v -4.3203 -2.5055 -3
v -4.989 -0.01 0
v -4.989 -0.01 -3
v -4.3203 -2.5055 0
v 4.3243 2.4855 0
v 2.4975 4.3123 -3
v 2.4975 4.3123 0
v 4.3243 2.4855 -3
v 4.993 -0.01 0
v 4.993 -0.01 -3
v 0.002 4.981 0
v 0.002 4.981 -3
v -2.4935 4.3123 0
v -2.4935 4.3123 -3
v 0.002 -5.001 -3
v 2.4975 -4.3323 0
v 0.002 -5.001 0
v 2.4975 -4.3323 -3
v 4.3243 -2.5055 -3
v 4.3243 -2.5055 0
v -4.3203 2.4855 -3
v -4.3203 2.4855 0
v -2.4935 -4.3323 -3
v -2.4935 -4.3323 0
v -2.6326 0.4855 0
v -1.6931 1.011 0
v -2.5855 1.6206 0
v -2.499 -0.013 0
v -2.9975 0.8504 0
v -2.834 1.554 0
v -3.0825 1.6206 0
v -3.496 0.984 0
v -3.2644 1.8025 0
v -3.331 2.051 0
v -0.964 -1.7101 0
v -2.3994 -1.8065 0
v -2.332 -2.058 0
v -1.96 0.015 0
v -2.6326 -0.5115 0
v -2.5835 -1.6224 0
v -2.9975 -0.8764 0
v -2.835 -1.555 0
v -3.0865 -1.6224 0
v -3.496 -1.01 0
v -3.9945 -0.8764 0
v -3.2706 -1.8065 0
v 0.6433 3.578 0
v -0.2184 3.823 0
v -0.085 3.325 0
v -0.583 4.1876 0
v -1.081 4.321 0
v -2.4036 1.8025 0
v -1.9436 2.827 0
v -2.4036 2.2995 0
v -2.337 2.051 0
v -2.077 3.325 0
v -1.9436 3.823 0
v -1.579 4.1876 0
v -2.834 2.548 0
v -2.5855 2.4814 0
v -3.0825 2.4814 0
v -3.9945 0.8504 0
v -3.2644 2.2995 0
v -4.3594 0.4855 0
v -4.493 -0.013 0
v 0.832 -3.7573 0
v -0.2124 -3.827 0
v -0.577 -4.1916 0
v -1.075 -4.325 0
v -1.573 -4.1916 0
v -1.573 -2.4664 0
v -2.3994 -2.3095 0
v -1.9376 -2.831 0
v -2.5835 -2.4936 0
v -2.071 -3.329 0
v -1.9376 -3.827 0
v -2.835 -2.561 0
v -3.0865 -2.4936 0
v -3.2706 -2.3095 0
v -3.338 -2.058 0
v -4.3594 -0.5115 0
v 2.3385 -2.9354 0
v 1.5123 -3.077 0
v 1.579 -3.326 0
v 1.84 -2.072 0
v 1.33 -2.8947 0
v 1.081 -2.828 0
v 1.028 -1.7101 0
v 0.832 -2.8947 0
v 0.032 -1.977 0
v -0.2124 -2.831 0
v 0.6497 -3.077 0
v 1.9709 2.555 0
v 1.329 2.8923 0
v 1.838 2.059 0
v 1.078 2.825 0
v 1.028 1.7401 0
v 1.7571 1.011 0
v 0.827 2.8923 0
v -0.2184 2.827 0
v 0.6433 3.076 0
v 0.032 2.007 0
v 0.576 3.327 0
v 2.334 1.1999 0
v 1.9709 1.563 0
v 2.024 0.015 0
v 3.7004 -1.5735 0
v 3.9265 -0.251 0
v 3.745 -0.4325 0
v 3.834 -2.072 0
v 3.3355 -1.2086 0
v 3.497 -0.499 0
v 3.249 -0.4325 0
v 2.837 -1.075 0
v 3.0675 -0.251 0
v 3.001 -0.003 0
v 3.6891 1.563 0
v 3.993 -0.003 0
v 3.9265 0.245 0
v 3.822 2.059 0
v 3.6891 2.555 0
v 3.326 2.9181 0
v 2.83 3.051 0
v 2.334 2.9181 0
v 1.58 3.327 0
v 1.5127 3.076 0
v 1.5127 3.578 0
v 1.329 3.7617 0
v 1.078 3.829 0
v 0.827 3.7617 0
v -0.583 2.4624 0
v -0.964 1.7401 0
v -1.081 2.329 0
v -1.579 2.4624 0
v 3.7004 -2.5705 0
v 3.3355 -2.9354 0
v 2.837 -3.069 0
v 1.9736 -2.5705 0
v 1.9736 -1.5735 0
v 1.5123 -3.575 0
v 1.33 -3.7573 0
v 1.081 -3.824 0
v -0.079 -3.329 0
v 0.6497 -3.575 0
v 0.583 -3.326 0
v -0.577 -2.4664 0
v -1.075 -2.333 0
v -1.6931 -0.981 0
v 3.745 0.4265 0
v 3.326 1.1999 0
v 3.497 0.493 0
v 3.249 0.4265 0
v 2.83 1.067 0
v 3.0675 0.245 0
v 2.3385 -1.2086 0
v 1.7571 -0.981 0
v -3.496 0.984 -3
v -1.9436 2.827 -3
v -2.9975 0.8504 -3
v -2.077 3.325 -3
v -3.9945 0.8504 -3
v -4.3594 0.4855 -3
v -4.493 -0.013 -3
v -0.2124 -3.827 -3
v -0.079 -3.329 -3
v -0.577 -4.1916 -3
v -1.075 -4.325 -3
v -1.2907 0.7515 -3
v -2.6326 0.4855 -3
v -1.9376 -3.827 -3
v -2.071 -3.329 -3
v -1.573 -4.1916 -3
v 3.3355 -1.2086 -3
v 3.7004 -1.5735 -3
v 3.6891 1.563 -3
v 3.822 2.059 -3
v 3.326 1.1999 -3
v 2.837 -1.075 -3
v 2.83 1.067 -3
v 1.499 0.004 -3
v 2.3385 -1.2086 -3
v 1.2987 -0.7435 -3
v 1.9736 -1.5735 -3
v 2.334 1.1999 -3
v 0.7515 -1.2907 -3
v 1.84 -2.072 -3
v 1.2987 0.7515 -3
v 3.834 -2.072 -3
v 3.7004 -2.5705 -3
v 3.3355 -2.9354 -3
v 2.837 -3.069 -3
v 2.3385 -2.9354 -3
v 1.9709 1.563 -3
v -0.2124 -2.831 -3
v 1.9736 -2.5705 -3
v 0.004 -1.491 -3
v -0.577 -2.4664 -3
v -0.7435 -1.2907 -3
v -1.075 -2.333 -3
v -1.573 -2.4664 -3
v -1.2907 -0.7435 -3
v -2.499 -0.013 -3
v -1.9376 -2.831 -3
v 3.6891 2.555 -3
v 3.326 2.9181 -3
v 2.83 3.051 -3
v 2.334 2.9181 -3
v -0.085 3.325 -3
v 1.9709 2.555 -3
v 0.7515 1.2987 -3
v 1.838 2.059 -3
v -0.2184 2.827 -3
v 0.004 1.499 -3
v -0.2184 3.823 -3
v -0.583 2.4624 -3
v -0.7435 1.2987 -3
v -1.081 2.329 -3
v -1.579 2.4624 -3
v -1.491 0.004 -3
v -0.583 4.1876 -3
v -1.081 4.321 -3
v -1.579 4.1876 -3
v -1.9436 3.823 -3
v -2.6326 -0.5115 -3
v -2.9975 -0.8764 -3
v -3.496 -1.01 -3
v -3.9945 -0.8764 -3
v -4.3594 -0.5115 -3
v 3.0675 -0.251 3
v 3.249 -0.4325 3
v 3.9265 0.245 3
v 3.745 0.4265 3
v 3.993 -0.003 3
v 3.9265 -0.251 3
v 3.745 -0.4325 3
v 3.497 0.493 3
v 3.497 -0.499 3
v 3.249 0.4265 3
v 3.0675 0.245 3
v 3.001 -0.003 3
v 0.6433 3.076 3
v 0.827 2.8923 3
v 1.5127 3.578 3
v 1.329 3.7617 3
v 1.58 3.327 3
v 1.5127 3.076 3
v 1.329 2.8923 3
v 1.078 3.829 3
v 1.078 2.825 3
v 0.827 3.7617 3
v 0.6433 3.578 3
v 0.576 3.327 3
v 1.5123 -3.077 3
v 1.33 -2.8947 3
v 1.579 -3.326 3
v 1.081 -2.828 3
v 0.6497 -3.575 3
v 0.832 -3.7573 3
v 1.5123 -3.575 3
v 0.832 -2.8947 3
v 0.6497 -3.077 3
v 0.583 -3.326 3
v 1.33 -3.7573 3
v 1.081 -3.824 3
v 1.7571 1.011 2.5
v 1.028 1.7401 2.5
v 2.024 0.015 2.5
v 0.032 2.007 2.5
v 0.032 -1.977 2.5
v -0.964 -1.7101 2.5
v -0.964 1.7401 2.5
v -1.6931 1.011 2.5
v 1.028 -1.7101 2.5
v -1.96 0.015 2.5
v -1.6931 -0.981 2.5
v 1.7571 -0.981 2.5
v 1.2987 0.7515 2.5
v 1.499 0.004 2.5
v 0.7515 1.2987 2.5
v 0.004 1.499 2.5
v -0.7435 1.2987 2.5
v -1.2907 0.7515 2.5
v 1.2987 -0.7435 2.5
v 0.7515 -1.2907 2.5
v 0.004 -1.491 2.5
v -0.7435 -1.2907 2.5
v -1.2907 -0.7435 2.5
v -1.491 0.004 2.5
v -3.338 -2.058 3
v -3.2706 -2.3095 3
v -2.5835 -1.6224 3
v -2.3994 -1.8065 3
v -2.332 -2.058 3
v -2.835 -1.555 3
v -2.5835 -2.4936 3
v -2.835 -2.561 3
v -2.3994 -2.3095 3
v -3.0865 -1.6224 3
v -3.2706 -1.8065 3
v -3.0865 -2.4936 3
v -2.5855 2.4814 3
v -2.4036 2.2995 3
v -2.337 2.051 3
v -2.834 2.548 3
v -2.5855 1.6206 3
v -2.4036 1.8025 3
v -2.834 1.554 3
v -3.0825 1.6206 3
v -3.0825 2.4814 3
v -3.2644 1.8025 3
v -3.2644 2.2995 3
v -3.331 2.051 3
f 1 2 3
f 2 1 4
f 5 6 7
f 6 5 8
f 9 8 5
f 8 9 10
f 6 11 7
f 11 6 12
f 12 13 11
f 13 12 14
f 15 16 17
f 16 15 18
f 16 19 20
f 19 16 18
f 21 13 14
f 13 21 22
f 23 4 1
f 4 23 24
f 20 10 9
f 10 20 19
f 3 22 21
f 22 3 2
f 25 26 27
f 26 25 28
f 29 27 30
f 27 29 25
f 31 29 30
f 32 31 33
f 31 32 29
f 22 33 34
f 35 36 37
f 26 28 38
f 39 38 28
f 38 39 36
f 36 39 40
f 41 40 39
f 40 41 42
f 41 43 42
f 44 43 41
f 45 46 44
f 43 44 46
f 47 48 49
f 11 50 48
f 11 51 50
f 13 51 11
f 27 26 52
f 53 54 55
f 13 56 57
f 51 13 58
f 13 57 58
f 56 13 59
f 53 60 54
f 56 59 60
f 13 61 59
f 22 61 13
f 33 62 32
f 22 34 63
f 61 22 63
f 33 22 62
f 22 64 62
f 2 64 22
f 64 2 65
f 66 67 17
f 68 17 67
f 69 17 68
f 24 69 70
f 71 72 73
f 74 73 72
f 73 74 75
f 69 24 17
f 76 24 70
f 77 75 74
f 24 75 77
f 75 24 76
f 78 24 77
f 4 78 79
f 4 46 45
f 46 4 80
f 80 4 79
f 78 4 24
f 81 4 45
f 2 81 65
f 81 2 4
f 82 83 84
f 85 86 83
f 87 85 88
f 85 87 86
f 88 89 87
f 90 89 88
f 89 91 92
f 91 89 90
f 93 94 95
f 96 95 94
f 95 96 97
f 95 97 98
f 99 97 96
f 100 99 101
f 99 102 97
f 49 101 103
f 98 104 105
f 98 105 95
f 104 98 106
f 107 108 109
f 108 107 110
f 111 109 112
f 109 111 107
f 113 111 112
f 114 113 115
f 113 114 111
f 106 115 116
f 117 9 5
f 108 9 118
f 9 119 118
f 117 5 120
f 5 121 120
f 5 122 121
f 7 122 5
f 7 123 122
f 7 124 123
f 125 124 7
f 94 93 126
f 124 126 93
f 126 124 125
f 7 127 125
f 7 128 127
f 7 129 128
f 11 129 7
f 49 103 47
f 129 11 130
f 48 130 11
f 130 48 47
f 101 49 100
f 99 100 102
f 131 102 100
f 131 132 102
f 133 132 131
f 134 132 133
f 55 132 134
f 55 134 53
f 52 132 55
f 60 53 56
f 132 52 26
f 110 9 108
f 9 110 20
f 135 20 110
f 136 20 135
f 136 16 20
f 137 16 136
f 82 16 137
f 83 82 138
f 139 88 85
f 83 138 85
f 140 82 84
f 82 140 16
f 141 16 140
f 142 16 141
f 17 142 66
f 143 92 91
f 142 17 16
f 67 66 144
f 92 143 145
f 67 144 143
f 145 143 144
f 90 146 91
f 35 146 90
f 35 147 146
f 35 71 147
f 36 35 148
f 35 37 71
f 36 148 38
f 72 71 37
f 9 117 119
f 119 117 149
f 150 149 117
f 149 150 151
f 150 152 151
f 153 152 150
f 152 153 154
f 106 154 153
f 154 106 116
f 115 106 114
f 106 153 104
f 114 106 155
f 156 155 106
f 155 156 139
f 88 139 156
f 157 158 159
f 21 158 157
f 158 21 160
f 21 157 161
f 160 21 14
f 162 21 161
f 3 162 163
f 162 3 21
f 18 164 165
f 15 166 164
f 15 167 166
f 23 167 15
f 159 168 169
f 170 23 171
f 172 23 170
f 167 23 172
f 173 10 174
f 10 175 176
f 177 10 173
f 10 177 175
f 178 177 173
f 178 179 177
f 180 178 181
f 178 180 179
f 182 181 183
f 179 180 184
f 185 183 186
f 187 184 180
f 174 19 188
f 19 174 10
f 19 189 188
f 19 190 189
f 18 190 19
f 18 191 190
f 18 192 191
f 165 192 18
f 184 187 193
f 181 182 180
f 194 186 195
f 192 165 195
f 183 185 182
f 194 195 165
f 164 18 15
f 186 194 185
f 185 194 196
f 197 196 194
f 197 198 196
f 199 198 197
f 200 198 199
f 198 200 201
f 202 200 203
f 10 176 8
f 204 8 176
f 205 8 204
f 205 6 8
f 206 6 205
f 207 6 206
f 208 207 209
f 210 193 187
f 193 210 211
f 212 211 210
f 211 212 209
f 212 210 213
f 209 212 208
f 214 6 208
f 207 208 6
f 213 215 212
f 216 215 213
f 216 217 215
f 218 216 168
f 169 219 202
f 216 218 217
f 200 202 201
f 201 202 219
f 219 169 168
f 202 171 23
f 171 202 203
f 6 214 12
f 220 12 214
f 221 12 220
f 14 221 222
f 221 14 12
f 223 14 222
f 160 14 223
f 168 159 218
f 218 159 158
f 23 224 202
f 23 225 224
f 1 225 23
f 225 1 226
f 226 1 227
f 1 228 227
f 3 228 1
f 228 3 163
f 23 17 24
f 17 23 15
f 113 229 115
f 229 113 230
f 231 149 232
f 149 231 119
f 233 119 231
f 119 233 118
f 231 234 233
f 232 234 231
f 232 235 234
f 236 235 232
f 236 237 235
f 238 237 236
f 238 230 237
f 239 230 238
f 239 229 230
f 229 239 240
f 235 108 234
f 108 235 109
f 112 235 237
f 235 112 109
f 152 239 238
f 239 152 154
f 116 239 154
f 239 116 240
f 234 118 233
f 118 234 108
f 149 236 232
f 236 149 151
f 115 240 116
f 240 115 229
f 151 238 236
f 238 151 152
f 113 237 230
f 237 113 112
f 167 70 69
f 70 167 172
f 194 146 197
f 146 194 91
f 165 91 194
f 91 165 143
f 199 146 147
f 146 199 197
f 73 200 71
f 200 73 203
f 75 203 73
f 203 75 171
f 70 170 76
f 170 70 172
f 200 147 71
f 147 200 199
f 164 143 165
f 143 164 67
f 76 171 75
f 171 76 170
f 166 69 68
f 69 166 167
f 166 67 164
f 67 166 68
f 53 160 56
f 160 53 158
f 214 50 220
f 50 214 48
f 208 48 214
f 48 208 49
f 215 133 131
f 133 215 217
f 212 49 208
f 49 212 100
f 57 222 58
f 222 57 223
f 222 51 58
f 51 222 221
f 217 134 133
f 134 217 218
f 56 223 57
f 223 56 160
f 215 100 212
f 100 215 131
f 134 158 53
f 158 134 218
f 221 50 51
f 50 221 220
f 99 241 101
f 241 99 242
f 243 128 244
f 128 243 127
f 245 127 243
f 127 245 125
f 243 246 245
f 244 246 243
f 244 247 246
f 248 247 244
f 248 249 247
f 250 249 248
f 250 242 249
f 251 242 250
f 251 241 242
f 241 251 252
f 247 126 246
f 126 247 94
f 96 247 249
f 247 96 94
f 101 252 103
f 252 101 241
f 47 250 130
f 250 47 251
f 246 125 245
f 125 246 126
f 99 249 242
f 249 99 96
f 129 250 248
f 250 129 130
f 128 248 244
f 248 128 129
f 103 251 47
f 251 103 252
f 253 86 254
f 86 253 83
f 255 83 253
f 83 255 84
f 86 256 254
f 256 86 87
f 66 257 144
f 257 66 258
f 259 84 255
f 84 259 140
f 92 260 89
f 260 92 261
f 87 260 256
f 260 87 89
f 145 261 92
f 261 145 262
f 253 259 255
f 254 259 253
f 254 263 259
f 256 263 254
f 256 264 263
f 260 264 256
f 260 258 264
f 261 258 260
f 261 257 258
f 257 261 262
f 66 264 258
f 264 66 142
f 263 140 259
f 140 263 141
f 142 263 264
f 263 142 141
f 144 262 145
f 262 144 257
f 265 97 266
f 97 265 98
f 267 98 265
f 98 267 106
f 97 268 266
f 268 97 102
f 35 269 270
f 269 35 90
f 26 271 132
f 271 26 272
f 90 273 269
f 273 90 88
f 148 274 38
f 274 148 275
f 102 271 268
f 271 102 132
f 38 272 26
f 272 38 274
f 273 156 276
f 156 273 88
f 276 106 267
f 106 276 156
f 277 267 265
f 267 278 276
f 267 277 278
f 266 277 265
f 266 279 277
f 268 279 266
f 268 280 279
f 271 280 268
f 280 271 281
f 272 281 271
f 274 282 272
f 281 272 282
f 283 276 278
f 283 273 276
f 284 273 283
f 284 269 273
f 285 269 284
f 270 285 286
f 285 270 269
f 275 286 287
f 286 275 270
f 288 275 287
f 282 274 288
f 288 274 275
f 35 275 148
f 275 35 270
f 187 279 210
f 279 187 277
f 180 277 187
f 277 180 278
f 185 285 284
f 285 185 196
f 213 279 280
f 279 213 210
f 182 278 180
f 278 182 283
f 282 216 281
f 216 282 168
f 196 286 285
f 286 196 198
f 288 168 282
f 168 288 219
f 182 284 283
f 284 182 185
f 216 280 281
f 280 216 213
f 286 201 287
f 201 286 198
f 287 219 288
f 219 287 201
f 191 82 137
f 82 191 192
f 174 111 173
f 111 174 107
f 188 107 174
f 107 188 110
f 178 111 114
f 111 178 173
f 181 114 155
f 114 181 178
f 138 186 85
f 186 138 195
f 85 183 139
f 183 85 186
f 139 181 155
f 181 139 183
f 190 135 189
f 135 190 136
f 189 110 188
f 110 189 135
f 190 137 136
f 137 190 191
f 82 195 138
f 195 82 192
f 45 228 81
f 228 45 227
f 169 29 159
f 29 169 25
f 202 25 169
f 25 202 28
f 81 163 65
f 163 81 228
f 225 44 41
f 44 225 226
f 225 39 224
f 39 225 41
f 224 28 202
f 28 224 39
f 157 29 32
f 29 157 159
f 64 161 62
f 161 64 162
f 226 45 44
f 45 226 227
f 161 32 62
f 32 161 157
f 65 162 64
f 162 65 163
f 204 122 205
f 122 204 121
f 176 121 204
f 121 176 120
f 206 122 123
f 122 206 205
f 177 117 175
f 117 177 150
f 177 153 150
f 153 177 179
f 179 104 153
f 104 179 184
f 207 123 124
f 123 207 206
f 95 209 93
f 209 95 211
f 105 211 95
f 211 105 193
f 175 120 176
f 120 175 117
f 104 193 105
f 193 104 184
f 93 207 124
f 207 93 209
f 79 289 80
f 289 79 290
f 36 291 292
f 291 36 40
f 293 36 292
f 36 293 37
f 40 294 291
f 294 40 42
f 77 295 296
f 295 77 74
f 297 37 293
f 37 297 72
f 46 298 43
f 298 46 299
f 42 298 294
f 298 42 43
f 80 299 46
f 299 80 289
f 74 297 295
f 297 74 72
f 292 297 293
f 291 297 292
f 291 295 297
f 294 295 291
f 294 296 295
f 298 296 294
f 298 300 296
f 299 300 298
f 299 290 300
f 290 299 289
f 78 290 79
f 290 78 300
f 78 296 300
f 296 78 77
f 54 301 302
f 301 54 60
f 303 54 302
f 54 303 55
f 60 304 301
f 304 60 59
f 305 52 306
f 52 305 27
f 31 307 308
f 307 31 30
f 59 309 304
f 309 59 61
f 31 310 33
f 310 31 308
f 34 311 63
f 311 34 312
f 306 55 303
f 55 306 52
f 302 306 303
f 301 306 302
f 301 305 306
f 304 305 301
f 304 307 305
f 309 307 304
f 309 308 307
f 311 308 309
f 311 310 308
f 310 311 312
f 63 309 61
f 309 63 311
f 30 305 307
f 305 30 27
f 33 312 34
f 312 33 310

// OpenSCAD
intersection() {
translate([-6, -6, -3.6]) cube(size = [12, 12, 7.2], center = false);
union() {
difference() {
union() {
translate([1.078, 3.327, -3])
cylinder(h = 6, r1 = 0.502, r2 = 0.502, center = false, $fn = 12);
difference() {
union() {
translate([0.002, -0.01, -3])
cylinder(h = 3, r1 = 4.991, r2 = 4.991, center = false, $fn = 12);
translate([3.497, -0.003, 0])
cylinder(h = 3, r1 = 0.496, r2 = 0.496, center = false, $fn = 12);
}
union() {
translate([-1.075, -3.329, -19])
cylinder(h = 38, r1 = 0.996, r2 = 0.996, center = false, $fn = 12);
translate([-1.081, 3.325, -19])
cylinder(h = 38, r1 = 0.996, r2 = 0.996, center = false, $fn = 12);
}
}
translate([1.081, -3.326, 0])
cylinder(h = 3, r1 = 0.498, r2 = 0.498, center = false, $fn = 12);
translate([0.032, 0.015, 0])
cylinder(h = 2.5, r1 = 1.992, r2 = 1.992, center = false, $fn = 12);
}
union() {
translate([0.004, 0.004, -3])
cylinder(h = 5.5, r1 = 1.495, r2 = 1.495, center = false, $fn = 12);
translate([2.837, -2.072, -3])
cylinder(h = 22, r1 = 0.997, r2 = 0.997, center = false, $fn = 12);
translate([-3.496, -0.013, -3])
cylinder(h = 22, r1 = 0.997, r2 = 0.997, center = false, $fn = 12);
translate([2.83, 2.059, -3])
cylinder(h = 3, r1 = 0.992, r2 = 0.992, center = false, $fn = 12);
}
}
translate([-2.835, -2.058, 0])
cylinder(h = 3, r1 = 0.503, r2 = 0.503, center = false, $fn = 12);
translate([-2.834, 2.051, 0])
cylinder(h = 3, r1 = 0.497, r2 = 0.497, center = false, $fn = 12);
}
}
